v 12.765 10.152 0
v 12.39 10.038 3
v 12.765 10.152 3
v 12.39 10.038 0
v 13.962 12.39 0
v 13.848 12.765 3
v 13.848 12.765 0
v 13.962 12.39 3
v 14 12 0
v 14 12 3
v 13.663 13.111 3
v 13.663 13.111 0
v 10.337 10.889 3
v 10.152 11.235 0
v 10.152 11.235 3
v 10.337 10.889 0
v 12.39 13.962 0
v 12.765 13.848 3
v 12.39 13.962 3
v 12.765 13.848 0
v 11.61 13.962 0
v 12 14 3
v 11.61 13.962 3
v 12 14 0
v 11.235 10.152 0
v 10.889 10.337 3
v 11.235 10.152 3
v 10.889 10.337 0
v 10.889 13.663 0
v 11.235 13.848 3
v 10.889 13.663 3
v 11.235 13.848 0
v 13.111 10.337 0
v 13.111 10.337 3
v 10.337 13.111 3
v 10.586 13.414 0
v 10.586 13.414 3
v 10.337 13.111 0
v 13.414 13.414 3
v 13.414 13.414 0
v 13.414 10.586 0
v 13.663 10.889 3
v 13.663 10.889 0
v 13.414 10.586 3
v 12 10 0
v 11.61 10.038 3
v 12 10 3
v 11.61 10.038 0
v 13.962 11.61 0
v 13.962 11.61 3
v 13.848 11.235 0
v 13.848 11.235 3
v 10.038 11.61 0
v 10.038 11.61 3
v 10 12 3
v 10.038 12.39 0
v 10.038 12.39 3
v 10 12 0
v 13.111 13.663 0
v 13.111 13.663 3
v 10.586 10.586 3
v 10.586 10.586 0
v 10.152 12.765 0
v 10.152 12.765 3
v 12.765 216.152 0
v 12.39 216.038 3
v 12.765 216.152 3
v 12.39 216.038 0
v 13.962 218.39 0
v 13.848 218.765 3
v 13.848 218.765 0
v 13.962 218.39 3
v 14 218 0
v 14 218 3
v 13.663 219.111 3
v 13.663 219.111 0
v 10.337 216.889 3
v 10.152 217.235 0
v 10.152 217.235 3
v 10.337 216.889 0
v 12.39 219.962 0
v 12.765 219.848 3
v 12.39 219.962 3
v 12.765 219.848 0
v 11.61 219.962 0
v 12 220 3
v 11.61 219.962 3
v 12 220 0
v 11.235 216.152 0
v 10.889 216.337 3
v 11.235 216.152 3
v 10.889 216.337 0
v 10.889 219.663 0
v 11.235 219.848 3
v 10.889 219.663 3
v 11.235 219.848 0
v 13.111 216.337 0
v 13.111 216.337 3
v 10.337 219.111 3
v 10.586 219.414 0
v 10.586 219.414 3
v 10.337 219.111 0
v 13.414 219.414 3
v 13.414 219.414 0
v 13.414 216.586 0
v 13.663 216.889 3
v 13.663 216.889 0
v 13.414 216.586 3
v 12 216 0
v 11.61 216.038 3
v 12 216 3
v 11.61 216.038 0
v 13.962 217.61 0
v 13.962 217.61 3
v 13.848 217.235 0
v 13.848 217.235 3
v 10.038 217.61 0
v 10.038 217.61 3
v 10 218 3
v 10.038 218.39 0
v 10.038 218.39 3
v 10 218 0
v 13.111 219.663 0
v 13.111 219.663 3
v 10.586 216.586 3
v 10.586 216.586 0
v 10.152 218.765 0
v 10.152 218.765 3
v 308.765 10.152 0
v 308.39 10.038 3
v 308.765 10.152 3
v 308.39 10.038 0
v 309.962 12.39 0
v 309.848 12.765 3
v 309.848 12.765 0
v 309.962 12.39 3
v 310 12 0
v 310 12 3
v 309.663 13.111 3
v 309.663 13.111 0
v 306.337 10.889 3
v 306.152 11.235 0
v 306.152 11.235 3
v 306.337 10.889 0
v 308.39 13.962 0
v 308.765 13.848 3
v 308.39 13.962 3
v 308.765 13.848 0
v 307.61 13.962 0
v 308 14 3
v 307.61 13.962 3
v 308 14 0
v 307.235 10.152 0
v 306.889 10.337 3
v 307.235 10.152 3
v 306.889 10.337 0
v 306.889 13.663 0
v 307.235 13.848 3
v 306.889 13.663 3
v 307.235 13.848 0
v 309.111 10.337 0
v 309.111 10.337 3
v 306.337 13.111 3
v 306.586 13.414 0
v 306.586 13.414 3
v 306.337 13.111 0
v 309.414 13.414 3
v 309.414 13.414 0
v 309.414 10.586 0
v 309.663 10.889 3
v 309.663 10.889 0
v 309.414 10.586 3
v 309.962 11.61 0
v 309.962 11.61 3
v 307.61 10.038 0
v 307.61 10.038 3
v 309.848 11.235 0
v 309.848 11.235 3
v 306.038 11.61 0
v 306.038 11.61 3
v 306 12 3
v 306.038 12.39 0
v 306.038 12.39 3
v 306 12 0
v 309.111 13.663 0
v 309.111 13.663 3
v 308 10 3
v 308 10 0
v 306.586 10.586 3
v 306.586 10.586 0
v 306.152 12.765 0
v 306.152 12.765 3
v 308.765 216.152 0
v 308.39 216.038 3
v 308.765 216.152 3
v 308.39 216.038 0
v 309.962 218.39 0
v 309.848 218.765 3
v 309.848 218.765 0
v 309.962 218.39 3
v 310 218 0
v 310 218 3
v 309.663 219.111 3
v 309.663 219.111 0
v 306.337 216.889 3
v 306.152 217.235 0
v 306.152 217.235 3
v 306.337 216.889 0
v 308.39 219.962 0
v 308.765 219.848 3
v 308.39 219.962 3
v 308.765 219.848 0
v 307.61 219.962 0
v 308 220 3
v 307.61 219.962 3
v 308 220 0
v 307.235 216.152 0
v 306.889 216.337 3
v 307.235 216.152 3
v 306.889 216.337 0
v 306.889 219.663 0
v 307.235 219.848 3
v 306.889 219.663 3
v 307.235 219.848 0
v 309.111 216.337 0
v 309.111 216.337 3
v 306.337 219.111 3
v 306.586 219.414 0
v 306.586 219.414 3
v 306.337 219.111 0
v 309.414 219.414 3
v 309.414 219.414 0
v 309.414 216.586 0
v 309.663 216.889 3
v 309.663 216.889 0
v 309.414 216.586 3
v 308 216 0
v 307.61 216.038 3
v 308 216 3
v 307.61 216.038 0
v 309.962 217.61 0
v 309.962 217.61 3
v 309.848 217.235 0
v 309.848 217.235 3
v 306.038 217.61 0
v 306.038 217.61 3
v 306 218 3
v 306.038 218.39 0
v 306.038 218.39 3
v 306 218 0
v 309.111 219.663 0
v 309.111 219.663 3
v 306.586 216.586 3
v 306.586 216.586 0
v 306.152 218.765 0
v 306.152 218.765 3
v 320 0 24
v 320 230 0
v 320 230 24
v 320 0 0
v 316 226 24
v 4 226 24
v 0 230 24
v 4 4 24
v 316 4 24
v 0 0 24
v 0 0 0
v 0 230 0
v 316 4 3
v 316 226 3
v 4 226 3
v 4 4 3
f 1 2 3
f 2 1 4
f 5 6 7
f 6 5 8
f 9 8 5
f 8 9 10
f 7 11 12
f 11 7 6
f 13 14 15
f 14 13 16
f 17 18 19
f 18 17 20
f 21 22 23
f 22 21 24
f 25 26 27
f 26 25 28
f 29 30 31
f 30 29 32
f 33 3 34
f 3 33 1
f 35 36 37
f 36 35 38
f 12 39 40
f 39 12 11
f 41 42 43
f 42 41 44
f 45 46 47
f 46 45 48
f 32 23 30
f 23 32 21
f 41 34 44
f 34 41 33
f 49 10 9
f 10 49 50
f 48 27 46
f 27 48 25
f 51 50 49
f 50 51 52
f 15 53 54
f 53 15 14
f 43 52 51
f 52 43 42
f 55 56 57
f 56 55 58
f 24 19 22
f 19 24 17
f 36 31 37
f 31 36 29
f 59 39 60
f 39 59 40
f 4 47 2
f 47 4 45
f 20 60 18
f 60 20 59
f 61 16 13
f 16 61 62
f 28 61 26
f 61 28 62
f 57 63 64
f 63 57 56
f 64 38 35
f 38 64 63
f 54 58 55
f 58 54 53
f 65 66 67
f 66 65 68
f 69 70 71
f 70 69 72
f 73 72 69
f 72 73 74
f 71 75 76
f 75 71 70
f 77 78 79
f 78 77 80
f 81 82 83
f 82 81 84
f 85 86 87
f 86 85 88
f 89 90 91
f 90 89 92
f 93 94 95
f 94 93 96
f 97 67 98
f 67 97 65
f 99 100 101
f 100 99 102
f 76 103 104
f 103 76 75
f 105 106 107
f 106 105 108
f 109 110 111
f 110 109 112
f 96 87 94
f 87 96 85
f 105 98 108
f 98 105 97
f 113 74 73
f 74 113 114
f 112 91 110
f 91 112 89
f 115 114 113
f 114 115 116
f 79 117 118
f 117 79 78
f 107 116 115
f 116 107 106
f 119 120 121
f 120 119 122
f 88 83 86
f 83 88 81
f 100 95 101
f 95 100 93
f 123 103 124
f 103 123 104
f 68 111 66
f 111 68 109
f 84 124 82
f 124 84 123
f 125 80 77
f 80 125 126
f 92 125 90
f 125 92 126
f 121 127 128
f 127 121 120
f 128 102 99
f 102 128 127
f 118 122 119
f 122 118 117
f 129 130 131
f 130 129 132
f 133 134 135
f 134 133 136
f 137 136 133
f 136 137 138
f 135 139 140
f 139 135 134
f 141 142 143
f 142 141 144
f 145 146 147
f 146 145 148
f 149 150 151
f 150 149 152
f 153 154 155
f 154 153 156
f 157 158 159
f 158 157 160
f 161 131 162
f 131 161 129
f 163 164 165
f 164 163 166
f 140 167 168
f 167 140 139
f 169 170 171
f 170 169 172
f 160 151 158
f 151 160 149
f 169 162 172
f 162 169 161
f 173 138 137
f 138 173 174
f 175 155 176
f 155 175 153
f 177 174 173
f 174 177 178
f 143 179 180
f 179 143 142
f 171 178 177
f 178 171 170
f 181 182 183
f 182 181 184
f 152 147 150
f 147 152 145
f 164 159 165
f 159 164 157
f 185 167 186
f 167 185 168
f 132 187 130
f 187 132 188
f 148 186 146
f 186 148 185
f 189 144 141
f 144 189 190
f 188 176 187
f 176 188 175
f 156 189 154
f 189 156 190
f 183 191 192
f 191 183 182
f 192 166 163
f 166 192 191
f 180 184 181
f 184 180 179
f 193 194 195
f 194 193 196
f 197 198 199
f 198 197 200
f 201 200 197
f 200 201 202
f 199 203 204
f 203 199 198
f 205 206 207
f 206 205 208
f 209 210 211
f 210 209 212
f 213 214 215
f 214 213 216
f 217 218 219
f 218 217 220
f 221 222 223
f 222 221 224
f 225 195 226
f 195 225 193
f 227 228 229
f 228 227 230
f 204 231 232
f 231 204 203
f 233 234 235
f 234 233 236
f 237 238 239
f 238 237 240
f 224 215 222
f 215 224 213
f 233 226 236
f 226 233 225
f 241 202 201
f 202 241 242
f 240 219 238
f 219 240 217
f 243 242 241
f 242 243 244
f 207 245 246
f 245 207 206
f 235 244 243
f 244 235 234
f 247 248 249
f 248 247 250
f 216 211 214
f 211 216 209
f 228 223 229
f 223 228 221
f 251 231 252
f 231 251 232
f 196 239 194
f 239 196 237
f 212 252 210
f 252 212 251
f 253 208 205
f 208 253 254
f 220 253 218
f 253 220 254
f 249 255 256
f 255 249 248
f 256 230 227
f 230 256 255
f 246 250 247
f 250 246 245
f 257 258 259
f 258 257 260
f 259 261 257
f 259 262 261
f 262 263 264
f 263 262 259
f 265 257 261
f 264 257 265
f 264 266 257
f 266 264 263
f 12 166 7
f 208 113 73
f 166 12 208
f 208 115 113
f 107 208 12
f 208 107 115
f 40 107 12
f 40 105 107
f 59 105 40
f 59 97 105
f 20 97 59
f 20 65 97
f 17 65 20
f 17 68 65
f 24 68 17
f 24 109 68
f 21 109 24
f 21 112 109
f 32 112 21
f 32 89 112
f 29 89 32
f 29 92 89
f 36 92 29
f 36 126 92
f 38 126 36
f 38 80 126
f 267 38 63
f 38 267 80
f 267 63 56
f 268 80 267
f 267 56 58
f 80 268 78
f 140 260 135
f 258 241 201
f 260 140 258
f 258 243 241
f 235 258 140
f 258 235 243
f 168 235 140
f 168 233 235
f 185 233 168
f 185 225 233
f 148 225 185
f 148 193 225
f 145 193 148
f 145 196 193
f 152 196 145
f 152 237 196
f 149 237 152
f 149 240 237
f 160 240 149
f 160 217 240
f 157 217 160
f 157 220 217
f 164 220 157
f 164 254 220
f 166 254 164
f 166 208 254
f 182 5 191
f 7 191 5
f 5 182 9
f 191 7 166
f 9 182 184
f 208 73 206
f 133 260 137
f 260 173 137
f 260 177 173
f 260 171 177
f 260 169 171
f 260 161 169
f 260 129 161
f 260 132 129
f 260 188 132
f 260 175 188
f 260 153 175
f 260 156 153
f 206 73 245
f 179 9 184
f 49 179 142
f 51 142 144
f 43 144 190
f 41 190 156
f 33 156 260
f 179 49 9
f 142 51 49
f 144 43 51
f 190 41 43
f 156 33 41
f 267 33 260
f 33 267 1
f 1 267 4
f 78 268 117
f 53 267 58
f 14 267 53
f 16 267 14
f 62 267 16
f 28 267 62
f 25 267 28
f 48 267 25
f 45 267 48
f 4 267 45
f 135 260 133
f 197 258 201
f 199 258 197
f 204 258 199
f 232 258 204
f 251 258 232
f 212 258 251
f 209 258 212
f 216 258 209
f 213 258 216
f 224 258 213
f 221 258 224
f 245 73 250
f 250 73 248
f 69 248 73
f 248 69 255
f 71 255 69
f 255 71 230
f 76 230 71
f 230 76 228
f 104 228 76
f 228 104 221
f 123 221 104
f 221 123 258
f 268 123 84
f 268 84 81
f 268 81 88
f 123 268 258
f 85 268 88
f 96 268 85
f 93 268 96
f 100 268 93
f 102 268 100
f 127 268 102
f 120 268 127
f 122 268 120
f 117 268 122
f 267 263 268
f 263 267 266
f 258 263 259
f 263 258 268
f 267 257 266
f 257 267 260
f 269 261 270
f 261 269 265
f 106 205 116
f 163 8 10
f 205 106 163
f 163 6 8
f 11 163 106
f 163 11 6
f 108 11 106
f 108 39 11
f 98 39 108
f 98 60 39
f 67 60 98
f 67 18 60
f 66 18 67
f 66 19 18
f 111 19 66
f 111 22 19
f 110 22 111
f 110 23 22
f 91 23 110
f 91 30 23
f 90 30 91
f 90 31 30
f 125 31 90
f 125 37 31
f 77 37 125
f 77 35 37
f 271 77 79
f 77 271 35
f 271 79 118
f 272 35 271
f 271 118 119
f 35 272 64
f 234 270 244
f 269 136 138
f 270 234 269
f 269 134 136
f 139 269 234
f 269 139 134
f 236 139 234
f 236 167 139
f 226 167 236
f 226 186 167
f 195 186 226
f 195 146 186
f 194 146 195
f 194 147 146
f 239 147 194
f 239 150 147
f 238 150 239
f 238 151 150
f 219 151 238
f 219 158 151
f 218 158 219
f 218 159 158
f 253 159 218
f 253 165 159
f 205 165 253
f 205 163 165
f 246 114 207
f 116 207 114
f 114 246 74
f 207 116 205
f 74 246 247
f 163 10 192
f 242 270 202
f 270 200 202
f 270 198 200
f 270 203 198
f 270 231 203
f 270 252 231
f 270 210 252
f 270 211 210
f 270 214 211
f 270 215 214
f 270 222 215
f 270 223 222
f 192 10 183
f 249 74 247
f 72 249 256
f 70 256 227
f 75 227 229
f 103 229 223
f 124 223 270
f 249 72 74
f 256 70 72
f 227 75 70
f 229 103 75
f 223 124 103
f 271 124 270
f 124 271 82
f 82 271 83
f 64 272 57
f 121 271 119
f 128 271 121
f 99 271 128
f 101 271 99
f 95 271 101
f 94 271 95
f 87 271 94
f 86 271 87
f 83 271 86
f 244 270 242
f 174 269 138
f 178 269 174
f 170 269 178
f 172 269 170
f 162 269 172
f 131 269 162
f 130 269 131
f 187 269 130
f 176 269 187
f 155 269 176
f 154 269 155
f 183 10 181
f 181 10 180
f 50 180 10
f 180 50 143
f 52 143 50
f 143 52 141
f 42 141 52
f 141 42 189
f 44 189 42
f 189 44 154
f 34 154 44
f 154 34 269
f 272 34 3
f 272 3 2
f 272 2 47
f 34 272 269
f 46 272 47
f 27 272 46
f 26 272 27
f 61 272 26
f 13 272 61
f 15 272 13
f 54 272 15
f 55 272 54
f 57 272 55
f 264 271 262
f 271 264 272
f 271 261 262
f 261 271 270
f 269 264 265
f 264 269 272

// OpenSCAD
// Concept only. Provisional dimensions in mm.
$fn=32;
difference(){cube([320,230,24]);translate([4,4,3])cube([312,222,24]);for(x=[12,308])for(y=[12,218])translate([x,y,-1])cylinder(h=26,r=2);}
